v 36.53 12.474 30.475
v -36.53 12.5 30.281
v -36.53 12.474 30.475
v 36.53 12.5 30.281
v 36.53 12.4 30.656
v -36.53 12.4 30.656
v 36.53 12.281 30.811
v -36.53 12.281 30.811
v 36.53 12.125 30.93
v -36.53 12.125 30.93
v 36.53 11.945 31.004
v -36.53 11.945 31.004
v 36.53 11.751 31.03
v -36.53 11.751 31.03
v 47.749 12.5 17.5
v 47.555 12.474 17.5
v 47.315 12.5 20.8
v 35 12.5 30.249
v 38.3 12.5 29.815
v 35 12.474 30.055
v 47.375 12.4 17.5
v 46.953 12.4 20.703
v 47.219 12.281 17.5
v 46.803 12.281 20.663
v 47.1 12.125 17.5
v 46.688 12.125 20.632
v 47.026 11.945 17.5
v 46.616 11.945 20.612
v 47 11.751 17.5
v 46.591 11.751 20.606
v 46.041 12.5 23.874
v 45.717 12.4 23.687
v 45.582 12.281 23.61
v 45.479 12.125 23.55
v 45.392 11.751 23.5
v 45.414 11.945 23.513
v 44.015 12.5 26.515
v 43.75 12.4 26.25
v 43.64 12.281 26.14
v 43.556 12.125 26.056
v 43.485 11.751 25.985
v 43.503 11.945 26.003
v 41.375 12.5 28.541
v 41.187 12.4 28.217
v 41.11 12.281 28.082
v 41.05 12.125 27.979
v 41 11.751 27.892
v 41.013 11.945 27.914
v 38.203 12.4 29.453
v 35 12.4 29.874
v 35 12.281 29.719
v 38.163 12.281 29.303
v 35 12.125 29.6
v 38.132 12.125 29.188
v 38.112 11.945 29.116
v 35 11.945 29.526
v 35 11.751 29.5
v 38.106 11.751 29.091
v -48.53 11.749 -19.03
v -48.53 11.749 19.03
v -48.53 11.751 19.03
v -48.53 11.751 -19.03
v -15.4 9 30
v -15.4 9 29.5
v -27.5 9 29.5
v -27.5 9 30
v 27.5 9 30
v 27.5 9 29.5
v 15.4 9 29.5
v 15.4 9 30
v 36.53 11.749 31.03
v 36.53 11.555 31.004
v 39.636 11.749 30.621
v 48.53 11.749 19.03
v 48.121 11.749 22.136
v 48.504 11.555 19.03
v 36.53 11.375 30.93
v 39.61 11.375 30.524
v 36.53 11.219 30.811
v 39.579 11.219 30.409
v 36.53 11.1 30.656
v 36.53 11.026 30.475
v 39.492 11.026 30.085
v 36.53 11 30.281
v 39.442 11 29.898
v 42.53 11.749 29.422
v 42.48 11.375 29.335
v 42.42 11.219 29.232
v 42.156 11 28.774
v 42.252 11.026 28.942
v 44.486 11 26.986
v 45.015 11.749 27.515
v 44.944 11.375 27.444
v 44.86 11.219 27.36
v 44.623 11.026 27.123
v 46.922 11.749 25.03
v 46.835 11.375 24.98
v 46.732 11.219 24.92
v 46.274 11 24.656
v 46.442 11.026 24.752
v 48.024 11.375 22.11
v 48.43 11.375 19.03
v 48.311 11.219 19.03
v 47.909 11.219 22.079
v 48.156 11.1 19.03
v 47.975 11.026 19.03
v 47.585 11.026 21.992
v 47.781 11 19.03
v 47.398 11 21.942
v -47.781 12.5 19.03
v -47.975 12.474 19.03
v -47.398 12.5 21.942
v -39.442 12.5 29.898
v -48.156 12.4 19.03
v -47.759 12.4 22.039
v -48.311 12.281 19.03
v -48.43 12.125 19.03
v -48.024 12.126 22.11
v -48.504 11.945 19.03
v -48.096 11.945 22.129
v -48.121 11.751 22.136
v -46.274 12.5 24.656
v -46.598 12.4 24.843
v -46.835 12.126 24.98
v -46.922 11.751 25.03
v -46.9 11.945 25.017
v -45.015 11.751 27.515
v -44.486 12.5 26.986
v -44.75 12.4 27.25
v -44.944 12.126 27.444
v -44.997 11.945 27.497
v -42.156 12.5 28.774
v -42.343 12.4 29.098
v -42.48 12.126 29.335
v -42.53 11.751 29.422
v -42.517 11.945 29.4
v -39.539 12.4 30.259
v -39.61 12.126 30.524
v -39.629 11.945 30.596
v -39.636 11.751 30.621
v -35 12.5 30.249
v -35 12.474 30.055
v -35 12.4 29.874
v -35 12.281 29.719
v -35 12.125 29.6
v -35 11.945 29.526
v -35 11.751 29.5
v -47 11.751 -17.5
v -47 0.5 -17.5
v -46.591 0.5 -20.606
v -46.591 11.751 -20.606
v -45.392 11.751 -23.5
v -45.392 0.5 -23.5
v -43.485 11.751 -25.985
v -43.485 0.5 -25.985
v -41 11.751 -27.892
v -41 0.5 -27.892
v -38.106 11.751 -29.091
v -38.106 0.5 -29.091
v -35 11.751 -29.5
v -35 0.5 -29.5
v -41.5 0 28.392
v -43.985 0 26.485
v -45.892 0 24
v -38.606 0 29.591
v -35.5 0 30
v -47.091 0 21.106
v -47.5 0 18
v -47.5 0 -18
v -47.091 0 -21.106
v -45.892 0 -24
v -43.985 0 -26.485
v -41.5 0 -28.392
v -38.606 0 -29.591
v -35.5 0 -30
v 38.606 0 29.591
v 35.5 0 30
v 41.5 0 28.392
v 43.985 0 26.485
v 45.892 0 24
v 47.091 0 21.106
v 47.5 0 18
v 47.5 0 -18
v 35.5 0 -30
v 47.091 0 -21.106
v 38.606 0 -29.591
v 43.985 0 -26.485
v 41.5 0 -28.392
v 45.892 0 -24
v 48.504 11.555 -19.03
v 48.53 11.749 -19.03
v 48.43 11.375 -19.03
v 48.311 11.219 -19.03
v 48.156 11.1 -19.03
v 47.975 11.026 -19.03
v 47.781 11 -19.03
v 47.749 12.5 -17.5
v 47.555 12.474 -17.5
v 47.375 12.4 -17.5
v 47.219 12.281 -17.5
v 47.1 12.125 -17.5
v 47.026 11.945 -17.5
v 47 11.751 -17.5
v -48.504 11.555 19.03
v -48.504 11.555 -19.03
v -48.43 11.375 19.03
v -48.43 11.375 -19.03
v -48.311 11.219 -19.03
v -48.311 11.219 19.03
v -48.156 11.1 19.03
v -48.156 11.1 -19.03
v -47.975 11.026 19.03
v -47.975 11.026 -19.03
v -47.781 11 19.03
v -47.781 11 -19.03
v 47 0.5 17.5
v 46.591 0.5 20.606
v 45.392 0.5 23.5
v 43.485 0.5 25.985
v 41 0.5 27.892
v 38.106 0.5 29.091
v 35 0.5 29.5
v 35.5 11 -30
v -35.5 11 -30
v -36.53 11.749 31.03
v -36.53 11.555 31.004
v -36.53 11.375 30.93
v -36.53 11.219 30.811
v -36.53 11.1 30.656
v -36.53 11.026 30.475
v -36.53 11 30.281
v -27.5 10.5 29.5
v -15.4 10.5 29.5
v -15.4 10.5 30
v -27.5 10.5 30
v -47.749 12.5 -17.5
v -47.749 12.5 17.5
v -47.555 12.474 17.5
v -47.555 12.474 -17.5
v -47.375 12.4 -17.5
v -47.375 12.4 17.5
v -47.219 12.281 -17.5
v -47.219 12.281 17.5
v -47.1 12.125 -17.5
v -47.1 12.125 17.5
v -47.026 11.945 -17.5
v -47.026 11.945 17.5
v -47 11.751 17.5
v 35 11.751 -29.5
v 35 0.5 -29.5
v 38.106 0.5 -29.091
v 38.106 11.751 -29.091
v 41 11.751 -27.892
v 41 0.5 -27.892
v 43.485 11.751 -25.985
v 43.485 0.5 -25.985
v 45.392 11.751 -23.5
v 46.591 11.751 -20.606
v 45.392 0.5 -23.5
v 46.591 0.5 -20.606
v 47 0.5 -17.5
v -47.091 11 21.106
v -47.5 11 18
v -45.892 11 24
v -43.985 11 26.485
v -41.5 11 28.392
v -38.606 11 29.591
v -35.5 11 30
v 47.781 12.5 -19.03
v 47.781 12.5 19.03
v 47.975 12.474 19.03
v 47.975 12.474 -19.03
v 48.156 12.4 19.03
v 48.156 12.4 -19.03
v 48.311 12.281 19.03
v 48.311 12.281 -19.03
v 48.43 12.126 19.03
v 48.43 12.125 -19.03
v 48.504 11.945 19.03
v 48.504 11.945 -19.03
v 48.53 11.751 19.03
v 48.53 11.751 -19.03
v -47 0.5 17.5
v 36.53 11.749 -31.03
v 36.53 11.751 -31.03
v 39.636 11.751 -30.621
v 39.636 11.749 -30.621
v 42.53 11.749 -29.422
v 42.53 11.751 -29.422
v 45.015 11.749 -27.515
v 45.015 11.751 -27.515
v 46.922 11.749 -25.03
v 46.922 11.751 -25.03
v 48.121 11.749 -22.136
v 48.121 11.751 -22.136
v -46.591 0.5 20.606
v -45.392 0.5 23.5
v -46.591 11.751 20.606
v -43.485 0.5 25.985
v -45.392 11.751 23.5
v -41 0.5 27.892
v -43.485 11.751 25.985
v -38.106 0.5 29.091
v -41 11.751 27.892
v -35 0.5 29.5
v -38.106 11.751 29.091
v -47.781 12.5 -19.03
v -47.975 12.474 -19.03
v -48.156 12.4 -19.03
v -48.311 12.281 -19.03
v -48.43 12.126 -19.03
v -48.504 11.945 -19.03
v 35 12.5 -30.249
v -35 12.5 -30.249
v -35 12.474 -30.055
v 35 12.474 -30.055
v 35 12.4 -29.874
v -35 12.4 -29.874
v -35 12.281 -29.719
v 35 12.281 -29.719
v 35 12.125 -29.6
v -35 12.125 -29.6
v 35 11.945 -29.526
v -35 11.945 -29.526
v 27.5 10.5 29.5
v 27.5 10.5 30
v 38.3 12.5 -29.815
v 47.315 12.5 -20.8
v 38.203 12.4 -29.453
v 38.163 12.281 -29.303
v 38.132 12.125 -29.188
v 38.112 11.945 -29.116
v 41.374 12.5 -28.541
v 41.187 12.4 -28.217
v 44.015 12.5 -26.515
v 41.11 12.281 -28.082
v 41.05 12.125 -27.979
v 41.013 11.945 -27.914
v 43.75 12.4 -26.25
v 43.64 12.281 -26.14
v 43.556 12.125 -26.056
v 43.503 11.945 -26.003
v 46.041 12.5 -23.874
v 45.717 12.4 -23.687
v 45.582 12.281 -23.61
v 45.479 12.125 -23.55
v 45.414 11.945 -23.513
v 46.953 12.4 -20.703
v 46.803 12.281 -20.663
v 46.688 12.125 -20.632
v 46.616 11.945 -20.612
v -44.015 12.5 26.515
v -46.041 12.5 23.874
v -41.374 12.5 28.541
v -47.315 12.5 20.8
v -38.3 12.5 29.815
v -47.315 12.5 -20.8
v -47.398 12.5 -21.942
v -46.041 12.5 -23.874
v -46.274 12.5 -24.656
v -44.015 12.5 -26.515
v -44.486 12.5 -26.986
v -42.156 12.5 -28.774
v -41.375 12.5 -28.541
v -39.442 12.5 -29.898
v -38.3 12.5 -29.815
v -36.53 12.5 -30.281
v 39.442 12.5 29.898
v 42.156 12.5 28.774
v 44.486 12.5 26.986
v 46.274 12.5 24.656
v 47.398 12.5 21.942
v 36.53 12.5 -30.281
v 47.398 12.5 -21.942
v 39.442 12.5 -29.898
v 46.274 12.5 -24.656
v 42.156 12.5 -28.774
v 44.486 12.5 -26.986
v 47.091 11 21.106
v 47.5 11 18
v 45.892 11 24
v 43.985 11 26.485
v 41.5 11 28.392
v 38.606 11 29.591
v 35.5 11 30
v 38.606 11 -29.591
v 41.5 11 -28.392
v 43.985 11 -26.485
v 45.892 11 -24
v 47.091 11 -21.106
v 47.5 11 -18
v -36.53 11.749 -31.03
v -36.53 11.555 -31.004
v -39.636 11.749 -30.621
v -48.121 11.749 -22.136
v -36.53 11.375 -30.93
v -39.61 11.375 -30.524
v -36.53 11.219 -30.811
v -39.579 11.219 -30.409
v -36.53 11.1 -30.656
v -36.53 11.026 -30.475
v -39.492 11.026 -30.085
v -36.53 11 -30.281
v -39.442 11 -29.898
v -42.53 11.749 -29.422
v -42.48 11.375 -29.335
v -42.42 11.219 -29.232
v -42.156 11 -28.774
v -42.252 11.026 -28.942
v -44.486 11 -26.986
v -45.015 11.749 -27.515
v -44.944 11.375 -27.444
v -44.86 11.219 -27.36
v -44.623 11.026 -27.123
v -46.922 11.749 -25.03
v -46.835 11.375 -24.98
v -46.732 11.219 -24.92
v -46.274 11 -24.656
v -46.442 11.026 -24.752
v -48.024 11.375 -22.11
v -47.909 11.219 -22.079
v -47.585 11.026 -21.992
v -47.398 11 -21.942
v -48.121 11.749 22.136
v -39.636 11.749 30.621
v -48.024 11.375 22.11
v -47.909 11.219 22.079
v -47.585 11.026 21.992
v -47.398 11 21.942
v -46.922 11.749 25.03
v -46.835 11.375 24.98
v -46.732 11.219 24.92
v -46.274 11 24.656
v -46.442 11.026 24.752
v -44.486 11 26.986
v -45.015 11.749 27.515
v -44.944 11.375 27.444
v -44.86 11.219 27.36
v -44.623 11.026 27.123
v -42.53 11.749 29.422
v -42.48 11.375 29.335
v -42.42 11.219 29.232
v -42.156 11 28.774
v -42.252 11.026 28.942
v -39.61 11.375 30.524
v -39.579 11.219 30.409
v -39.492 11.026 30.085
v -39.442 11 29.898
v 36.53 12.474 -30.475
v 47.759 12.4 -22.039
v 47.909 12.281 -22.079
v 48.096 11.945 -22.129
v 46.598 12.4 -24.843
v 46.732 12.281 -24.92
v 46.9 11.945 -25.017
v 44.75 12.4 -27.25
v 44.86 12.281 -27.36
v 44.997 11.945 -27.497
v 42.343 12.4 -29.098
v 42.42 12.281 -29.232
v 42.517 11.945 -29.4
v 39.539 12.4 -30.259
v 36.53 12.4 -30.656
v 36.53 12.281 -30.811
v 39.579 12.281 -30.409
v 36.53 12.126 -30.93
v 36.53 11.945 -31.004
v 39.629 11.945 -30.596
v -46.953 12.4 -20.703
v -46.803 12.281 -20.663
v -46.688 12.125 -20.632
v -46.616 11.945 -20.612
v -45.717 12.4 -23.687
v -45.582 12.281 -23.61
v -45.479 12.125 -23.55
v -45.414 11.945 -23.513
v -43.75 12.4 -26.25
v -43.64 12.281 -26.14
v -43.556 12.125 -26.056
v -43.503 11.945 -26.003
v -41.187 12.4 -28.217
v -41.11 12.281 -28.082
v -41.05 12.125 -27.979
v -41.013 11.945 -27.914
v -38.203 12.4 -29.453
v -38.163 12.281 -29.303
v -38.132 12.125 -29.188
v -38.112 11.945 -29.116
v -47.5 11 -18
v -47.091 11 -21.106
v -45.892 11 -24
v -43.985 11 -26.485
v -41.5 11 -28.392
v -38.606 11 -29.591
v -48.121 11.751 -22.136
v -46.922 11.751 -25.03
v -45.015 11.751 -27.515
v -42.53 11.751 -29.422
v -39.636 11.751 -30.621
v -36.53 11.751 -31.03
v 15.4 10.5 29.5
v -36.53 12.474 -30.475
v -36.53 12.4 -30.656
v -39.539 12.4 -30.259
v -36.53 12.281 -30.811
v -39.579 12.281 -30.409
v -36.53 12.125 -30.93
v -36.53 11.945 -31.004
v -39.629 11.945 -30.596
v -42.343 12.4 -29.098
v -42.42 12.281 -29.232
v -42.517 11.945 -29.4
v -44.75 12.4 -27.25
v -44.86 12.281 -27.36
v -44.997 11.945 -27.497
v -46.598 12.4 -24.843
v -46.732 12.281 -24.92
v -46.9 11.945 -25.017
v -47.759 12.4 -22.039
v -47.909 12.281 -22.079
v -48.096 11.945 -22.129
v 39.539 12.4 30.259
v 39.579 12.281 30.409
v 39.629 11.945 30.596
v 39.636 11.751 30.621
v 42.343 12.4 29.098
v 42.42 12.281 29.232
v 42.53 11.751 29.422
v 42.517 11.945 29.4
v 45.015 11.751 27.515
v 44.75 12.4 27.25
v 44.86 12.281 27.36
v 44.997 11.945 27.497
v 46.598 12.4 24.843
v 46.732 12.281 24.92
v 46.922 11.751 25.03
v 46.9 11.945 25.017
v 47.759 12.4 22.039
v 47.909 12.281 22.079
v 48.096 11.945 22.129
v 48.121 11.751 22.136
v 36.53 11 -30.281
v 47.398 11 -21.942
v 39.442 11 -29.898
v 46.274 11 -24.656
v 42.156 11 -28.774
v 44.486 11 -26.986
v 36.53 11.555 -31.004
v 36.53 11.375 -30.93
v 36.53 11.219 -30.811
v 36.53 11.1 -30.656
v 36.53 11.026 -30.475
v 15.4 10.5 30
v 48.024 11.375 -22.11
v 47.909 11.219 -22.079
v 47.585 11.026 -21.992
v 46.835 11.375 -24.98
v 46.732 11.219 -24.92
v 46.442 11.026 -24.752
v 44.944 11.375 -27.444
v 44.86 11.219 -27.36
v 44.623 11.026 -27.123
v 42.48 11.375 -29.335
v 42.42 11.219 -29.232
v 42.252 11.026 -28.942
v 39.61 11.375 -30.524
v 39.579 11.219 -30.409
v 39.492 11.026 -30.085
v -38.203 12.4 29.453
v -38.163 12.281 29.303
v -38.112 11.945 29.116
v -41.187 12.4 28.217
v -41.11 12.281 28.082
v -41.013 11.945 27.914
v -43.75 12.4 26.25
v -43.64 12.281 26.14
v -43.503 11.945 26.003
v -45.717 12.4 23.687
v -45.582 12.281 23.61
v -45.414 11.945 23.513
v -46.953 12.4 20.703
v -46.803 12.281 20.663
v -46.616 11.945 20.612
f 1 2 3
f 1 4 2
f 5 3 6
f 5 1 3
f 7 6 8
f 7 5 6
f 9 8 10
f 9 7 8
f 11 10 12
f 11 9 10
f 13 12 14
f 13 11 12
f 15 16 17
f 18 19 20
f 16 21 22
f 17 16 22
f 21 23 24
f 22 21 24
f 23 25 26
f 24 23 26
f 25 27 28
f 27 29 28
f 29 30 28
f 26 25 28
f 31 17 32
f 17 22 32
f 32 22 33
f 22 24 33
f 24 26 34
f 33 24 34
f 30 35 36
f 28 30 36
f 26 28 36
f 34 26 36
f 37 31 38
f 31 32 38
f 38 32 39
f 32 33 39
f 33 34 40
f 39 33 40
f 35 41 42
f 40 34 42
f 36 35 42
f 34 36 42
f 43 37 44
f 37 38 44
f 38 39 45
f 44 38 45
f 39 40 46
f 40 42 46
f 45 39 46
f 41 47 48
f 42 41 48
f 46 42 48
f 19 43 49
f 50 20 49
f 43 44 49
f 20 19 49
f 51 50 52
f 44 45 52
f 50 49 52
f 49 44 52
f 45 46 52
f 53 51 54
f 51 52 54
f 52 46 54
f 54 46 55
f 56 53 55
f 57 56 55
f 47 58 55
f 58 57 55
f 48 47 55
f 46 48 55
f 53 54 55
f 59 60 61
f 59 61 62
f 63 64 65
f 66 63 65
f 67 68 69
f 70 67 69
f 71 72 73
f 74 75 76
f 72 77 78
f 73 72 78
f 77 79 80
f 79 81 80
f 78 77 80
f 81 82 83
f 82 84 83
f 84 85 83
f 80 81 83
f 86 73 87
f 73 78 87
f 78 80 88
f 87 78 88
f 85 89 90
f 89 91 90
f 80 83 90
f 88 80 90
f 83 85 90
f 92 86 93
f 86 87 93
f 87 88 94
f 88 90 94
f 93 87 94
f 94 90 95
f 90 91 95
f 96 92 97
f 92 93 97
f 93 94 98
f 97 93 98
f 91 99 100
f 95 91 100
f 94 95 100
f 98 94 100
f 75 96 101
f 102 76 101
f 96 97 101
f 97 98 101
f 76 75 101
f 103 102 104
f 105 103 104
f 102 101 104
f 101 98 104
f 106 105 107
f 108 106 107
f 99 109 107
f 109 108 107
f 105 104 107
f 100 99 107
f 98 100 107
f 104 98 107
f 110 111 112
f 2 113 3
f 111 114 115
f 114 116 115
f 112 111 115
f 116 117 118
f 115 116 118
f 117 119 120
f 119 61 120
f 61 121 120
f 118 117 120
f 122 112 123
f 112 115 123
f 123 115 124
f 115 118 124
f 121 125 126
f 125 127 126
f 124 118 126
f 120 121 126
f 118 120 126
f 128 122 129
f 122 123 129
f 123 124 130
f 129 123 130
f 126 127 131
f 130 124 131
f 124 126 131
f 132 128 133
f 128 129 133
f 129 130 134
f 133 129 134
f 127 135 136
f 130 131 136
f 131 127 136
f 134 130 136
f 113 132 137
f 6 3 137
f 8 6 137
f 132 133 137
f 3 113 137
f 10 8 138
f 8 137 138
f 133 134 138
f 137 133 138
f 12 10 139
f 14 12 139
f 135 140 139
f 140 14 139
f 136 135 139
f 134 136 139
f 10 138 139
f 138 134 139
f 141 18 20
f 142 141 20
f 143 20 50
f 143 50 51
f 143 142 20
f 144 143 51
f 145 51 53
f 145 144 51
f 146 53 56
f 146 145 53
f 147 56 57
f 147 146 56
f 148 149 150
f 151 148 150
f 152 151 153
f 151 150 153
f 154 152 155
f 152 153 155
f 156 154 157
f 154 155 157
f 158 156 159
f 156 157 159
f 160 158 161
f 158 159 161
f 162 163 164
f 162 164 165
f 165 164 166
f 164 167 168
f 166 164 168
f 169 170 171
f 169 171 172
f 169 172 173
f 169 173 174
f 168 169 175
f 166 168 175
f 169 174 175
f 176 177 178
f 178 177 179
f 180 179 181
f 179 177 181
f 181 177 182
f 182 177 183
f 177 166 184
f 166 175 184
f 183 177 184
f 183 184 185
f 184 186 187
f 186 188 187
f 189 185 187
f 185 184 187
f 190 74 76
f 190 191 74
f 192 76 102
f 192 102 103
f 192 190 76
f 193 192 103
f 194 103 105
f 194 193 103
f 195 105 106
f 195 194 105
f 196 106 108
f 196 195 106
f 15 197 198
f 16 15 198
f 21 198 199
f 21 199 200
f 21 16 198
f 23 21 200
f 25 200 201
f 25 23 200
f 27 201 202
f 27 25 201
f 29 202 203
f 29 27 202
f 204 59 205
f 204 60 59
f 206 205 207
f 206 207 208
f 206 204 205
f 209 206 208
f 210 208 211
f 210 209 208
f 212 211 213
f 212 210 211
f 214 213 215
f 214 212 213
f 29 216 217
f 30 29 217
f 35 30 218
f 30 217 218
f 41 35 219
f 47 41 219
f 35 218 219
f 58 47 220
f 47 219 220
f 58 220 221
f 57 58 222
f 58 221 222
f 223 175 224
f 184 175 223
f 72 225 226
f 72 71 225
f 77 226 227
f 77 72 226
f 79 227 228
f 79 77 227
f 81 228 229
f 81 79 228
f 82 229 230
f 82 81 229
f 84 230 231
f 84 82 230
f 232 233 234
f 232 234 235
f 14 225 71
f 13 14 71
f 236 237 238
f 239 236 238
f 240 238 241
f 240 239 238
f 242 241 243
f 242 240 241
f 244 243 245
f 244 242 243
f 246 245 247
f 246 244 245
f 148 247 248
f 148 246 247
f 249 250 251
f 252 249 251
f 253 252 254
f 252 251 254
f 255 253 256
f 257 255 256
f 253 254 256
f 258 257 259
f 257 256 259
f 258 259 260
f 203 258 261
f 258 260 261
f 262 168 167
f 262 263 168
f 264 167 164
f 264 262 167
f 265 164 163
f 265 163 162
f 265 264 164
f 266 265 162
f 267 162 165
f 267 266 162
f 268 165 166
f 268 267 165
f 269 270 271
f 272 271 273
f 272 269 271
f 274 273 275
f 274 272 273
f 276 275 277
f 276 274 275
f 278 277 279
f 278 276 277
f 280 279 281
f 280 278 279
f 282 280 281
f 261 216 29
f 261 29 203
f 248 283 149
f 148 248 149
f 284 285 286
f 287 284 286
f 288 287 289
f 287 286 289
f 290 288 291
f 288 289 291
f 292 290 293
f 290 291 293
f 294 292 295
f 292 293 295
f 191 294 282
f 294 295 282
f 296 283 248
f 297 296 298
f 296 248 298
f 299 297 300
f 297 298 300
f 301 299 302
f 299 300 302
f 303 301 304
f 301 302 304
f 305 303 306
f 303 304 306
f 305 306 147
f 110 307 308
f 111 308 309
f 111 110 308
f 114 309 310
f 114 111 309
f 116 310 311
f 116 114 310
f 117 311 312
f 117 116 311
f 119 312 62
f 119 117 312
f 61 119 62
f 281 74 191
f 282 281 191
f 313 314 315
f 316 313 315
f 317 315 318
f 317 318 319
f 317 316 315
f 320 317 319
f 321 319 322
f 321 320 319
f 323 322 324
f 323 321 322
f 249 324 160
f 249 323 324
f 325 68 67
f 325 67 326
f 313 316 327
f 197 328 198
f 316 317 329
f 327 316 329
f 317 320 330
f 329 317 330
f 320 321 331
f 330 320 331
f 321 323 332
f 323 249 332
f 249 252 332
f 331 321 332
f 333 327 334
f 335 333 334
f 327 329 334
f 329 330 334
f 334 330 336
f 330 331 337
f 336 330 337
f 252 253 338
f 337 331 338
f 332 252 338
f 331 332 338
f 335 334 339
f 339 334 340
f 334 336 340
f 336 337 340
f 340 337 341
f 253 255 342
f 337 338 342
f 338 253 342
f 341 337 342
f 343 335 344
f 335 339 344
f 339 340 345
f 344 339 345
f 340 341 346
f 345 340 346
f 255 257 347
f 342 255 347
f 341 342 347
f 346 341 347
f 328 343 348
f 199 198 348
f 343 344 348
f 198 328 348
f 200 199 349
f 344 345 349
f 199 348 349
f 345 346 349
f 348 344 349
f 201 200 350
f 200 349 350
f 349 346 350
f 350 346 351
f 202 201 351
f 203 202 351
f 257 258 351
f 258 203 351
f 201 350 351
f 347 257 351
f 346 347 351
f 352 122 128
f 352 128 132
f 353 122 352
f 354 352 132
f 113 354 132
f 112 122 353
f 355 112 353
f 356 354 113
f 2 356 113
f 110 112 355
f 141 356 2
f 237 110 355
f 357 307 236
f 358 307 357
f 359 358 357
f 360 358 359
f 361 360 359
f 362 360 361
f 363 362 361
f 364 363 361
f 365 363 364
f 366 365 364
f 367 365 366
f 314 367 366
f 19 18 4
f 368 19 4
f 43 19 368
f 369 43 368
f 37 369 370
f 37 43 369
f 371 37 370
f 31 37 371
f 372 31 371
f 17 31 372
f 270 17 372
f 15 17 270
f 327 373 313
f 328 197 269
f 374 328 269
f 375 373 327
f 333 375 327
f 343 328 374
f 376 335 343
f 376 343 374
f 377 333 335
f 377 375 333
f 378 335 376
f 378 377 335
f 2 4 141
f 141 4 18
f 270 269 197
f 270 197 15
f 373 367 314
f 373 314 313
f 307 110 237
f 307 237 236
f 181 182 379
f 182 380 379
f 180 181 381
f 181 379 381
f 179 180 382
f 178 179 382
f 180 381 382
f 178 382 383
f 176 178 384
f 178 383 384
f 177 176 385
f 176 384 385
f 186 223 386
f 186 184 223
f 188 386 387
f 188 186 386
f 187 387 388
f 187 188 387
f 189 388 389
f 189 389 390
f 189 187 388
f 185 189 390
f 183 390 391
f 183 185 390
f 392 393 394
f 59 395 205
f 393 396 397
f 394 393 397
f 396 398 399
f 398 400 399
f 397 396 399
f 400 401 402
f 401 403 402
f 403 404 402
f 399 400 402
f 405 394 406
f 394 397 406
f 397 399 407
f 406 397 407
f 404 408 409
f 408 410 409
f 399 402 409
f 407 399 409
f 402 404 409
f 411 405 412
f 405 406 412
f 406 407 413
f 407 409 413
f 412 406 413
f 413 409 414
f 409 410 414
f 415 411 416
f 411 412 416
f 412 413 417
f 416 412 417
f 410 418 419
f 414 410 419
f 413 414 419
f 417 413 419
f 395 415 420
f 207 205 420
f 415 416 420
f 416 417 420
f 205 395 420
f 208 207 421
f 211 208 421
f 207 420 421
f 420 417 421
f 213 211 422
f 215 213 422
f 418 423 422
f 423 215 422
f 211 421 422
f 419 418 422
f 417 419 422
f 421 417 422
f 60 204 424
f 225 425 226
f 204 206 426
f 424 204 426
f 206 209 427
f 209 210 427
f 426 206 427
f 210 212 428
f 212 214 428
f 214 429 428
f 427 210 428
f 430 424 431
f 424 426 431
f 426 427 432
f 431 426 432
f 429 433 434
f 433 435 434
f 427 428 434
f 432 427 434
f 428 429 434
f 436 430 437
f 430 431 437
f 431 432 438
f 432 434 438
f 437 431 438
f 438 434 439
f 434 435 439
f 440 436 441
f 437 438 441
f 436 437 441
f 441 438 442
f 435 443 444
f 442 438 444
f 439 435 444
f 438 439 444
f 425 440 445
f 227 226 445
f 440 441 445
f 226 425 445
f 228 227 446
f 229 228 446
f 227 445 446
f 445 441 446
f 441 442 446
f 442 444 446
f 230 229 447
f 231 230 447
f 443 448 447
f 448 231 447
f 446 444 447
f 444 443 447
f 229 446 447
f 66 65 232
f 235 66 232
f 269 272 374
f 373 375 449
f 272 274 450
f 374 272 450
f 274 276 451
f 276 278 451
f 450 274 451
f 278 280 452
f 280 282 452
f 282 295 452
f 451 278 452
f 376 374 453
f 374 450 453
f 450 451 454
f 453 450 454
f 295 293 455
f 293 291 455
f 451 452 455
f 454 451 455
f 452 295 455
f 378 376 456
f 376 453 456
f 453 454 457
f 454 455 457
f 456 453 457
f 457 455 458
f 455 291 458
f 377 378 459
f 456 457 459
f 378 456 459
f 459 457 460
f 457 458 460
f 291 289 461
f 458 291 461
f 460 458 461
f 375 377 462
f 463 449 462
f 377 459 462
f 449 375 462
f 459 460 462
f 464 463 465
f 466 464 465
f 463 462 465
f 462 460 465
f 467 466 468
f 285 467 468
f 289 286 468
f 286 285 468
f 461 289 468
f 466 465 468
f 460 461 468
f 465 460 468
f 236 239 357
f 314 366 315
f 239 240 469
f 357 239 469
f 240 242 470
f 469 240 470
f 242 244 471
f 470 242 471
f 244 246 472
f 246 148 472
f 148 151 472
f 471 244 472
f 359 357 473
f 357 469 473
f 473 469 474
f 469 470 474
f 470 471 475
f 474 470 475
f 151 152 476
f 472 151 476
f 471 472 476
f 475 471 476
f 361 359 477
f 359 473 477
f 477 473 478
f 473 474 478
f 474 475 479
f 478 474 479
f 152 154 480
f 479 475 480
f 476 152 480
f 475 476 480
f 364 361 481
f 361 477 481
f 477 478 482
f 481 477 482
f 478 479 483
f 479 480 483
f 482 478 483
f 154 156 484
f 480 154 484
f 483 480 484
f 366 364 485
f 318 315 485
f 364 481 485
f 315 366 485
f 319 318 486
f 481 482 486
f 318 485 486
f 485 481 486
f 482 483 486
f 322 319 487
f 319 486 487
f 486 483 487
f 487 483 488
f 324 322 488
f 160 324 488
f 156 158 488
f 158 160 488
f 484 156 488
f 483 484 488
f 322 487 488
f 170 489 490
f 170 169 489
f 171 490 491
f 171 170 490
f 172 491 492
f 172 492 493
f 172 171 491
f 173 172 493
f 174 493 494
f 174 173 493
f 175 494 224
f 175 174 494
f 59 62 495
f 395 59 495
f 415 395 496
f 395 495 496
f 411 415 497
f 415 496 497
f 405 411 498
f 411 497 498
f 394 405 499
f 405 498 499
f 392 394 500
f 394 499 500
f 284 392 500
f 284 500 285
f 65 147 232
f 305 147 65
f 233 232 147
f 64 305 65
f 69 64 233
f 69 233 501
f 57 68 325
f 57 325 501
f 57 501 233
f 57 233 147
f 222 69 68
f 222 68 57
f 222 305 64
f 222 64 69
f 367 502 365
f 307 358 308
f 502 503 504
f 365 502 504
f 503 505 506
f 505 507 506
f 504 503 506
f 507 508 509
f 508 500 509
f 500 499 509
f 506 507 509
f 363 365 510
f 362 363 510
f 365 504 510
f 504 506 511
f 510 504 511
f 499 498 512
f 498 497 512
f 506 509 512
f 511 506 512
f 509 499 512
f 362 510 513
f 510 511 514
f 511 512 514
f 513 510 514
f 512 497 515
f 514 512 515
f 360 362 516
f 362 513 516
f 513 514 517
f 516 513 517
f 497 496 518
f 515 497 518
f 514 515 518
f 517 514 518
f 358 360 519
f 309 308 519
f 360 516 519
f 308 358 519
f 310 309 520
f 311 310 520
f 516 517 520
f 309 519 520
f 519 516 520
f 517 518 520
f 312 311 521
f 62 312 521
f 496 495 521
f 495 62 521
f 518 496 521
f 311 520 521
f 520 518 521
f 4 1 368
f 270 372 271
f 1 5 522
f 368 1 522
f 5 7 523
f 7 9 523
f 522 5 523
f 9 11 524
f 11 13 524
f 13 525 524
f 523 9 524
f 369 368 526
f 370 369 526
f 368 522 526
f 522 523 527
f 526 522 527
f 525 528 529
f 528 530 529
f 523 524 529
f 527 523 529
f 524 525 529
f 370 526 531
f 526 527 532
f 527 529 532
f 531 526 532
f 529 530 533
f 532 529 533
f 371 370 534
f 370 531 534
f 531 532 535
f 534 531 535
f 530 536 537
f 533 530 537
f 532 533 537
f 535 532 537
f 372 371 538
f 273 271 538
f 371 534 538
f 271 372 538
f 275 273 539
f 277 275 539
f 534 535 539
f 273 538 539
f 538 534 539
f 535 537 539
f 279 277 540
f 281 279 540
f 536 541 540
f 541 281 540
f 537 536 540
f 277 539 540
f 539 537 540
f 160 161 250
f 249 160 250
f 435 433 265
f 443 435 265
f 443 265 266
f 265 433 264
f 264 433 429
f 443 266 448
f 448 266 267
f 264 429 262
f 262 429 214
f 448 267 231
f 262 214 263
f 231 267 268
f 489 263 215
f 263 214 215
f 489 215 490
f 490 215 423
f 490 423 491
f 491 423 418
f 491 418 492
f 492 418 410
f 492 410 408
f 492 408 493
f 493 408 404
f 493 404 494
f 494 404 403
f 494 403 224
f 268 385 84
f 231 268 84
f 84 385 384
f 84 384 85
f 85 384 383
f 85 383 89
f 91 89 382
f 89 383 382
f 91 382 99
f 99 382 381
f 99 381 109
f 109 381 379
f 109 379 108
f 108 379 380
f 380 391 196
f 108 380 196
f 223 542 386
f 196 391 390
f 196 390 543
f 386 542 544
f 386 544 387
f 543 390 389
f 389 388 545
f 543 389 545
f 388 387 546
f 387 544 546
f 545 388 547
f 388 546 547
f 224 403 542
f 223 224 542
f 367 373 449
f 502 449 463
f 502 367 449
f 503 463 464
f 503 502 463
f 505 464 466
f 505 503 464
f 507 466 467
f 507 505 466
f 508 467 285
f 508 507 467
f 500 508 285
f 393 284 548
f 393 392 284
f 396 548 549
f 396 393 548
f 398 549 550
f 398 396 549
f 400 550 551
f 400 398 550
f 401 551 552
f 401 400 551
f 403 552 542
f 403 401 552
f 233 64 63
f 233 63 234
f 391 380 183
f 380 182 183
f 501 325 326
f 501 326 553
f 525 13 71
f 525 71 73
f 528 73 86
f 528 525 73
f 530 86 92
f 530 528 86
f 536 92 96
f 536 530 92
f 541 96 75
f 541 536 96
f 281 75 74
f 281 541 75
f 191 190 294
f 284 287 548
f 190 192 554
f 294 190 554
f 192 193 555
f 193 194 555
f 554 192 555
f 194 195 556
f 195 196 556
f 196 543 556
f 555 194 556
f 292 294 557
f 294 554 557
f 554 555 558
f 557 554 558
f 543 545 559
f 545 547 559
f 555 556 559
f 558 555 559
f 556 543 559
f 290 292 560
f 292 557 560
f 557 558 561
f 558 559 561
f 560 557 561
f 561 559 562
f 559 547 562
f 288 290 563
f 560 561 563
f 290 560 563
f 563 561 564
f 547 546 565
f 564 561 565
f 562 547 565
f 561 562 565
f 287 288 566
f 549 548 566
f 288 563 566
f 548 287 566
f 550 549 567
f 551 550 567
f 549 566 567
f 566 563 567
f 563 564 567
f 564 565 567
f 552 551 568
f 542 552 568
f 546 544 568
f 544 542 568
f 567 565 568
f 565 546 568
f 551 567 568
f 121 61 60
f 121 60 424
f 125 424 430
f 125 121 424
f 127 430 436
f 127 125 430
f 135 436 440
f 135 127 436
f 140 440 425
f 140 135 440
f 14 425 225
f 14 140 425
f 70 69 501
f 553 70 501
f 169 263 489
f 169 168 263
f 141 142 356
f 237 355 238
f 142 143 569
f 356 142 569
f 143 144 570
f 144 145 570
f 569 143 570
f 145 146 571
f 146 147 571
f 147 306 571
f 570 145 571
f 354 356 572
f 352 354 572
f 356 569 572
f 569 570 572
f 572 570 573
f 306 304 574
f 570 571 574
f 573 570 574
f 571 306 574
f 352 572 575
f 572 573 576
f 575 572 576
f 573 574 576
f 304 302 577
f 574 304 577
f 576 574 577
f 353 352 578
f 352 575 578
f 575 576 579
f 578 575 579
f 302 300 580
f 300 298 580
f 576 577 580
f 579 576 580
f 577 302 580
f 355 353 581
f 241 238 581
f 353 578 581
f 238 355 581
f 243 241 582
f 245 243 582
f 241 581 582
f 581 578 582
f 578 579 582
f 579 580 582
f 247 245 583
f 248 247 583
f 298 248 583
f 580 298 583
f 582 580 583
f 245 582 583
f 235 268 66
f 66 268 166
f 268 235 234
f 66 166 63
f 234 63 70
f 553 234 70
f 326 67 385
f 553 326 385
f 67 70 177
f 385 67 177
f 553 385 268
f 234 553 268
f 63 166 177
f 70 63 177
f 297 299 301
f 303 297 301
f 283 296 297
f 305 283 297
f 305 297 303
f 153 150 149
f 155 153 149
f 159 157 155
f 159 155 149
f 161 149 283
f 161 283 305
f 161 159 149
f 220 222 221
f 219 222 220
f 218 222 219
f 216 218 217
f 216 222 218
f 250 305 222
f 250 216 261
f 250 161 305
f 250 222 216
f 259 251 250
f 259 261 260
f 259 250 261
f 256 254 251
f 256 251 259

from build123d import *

# Parameters (mm, degrees)
SKETCH1_W           = 95
SKETCH1_H           = 60
BOSS_EXTRUDE1_DEPTH = 0.5
SKETCH2_W           = 95
SKETCH2_H           = 60
SKETCH2_W_2         = 94
SKETCH2_H_2         = 59
BOSS_EXTRUDE2_DEPTH = 10.5
SKETCH3_W           = 97.06
SKETCH3_H           = 62.06
SKETCH3_W_2         = 94
SKETCH3_H_2         = 59
BOSS_EXTRUDE3_DEPTH = 1.5
FILLET2_R           = 12
FILLET3_R           = 12
FILLET4_R           = 0.749
SKETCH4_W           = 12.1
SKETCH4_H           = 1.5
CUT_EXTRUDE1_DEPTH  = 0.5


with BuildPart() as part:
    # Sketch1 → Boss-Extrude1 (new body)
    with BuildSketch(Plane(origin=(0, 0, 0), x_dir=(1, 0, 0), z_dir=(0, 1, 0))):
        Rectangle(SKETCH1_W, SKETCH1_H)
    extrude(amount=BOSS_EXTRUDE1_DEPTH)

    # Sketch2 → Boss-Extrude2 (add)
    with BuildSketch(Plane(origin=(0, 0.5, 0), x_dir=(1, 0, 0), z_dir=(0, 1, 0))):
        Rectangle(SKETCH2_W, SKETCH2_H)
        Rectangle(SKETCH2_W_2, SKETCH2_H_2, mode=Mode.SUBTRACT)
    extrude(amount=BOSS_EXTRUDE2_DEPTH)

    # Sketch3 → Boss-Extrude3 (add)
    with BuildSketch(Plane(origin=(0, 11, 0), x_dir=(1, 0, 0), z_dir=(0, 1, 0))):
        Rectangle(SKETCH3_W, SKETCH3_H)
        Rectangle(SKETCH3_W_2, SKETCH3_H_2, mode=Mode.SUBTRACT)
    extrude(amount=BOSS_EXTRUDE3_DEPTH)

    # Fillet2
    fillet2_edges = [part.edges().sort_by_distance(p)[0] for p in [
        (-47, 6.5, 29.5),
        (47, 6.5, -29.5),
        (47, 6.5, 29.5),
        (-47.5, 5.5, -30),
    ]]
    fillet(fillet2_edges, radius=FILLET2_R)

    # Fillet3
    fillet3_edges = [part.edges().sort_by_distance(p)[0] for p in [
        (-47, 6.5, -29.5),
        (-48.53, 11.75, -31.03),
        (-48.53, 11.75, 31.03),
        (48.53, 11.75, 31.03),
        (48.53, 11.75, -31.03),
        (47.5, 5.5, -30),
        (47.5, 5.5, 30),
        (-47.5, 5.5, 30),
    ]]
    fillet(fillet3_edges, radius=FILLET3_R)

    # Fillet4
    fillet4_edges = [part.edges().sort_by_distance(p)[0] for p in [
        (0, 11, 31.03),
        (0, 12.5, 31.03),
        (-48.53, 11, 0),
        (-48.53, 12.5, 0),
        (48.53, 12.5, 0),
        (0, 12.5, -31.03),
        (-47, 12.5, 0),
        (45.015281374, 12.5, 27.515281374),
        (45.015281374, 12.5, -27.515281374),
        (-45.015281374, 12.5, 27.515281374),
        (0, 11, -31.03),
        (48.53, 11, 0),
        (-45.015281374, 11, -27.515281374),
        (-43.485281374, 12.5, -25.985281374),
        (45.015281374, 11, 27.515281374),
        (45.015281374, 11, -27.515281374),
        (-45.015281374, 11, 27.515281374),
        (-45.015281374, 12.5, -27.515281374),
        (47, 12.5, 0),
        (0, 12.5, -29.5),
        (0, 12.5, 29.5),
        (43.485281374, 12.5, -25.985281374),
        (43.485281374, 12.5, 25.985281374),
        (-43.485281374, 12.5, 25.985281374),
    ]]
    fillet(fillet4_edges, radius=FILLET4_R)

    # Sketch4 → Cut-Extrude1 (cut)
    with BuildSketch(Plane(origin=(0, 0, 29.5), x_dir=(-1, 0, 0), z_dir=(0, 0, -1))):
        with Locations((-21.45, 9.75)):
            Rectangle(SKETCH4_W, SKETCH4_H)
        with Locations((21.45, 9.75)):
            Rectangle(SKETCH4_W, SKETCH4_H)
    extrude(amount=-CUT_EXTRUDE1_DEPTH, mode=Mode.SUBTRACT)


solid = part.part
